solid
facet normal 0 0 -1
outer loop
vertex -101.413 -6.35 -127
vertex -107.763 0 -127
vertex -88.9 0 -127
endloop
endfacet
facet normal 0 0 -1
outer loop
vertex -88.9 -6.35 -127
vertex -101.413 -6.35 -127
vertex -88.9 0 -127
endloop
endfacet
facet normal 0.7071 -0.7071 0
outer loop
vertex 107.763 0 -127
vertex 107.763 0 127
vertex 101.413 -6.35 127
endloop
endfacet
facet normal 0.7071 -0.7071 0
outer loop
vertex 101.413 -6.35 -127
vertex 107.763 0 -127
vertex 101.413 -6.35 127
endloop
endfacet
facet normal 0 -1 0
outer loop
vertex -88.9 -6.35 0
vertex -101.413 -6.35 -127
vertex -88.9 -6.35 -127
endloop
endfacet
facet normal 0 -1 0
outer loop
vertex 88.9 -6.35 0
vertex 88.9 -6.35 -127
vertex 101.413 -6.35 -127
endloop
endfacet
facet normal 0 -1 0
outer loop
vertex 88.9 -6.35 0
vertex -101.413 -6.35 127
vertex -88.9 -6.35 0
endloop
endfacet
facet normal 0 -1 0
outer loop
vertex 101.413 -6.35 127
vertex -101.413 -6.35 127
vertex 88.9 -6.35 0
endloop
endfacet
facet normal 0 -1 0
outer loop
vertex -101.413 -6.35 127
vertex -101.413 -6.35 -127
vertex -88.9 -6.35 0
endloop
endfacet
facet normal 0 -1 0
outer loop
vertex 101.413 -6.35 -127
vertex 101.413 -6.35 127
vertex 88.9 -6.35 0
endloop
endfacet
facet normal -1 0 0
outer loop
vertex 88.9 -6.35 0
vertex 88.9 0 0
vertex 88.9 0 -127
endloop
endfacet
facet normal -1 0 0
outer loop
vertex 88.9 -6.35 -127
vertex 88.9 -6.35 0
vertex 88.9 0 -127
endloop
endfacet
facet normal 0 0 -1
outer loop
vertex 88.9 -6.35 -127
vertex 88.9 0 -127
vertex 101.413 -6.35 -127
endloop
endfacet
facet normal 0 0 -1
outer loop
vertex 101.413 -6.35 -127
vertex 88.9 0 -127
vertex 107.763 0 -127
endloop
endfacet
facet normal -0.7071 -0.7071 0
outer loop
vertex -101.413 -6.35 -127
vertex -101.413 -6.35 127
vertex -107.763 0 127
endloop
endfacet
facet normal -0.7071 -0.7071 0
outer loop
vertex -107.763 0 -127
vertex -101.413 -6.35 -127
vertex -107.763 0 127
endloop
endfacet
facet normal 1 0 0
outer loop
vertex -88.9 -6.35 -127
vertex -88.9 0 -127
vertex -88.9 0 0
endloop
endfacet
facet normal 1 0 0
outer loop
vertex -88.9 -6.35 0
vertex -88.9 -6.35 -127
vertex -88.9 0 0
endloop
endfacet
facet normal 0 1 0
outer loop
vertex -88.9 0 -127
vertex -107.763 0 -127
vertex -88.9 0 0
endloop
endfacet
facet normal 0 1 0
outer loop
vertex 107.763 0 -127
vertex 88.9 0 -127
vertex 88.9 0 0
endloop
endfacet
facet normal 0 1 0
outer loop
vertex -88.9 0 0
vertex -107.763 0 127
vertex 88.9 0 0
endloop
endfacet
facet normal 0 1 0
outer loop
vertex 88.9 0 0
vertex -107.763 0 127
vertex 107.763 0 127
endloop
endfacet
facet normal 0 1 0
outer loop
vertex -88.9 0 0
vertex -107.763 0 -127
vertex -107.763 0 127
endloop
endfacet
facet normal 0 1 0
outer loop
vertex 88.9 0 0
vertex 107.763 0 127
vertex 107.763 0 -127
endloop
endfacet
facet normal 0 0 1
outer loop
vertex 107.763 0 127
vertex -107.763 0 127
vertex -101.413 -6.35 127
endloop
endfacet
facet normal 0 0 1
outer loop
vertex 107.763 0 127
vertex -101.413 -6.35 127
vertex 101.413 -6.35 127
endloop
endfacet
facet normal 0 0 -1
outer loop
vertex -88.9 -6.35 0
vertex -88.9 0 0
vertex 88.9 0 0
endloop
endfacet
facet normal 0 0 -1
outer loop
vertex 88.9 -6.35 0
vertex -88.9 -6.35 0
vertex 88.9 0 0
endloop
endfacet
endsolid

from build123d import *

# Parameters (mm, degrees)
F0_W     = 215.526138
F0_H     = 254
F1_DEPTH = 6.35
F3_DEPTH = 254.001
F5_DEPTH = 25.4


with BuildPart() as f1:
    # F0 (on Front) → F1 (new body)
    with BuildSketch(Plane.XZ):
        Rectangle(F0_W, F0_H)
    extrude(amount=F1_DEPTH)

    # F2 (on face) → F3 (cut, through all)
    with BuildSketch(Plane.XY.offset(127)):
        Polygon((-107.763069, 0), (-107.763069, -6.35), (-101.413069, -6.35), align=None)
        Polygon((107.763069, 0), (101.413069, -6.35), (107.763069, -6.35), align=None)
    extrude(amount=-F3_DEPTH, mode=Mode.SUBTRACT)

    # F4 (on face) → F5 (cut)
    with BuildSketch(Plane(origin=(0, 0, 0), x_dir=(-1, 0, 0), z_dir=(0, 1, 0))):
        Polygon((88.9, 0), (0, 0), (-88.9, 0), (-88.9, -127), (88.9, -127), align=None)
    extrude(amount=-F5_DEPTH, mode=Mode.SUBTRACT)


solid = f1.part
